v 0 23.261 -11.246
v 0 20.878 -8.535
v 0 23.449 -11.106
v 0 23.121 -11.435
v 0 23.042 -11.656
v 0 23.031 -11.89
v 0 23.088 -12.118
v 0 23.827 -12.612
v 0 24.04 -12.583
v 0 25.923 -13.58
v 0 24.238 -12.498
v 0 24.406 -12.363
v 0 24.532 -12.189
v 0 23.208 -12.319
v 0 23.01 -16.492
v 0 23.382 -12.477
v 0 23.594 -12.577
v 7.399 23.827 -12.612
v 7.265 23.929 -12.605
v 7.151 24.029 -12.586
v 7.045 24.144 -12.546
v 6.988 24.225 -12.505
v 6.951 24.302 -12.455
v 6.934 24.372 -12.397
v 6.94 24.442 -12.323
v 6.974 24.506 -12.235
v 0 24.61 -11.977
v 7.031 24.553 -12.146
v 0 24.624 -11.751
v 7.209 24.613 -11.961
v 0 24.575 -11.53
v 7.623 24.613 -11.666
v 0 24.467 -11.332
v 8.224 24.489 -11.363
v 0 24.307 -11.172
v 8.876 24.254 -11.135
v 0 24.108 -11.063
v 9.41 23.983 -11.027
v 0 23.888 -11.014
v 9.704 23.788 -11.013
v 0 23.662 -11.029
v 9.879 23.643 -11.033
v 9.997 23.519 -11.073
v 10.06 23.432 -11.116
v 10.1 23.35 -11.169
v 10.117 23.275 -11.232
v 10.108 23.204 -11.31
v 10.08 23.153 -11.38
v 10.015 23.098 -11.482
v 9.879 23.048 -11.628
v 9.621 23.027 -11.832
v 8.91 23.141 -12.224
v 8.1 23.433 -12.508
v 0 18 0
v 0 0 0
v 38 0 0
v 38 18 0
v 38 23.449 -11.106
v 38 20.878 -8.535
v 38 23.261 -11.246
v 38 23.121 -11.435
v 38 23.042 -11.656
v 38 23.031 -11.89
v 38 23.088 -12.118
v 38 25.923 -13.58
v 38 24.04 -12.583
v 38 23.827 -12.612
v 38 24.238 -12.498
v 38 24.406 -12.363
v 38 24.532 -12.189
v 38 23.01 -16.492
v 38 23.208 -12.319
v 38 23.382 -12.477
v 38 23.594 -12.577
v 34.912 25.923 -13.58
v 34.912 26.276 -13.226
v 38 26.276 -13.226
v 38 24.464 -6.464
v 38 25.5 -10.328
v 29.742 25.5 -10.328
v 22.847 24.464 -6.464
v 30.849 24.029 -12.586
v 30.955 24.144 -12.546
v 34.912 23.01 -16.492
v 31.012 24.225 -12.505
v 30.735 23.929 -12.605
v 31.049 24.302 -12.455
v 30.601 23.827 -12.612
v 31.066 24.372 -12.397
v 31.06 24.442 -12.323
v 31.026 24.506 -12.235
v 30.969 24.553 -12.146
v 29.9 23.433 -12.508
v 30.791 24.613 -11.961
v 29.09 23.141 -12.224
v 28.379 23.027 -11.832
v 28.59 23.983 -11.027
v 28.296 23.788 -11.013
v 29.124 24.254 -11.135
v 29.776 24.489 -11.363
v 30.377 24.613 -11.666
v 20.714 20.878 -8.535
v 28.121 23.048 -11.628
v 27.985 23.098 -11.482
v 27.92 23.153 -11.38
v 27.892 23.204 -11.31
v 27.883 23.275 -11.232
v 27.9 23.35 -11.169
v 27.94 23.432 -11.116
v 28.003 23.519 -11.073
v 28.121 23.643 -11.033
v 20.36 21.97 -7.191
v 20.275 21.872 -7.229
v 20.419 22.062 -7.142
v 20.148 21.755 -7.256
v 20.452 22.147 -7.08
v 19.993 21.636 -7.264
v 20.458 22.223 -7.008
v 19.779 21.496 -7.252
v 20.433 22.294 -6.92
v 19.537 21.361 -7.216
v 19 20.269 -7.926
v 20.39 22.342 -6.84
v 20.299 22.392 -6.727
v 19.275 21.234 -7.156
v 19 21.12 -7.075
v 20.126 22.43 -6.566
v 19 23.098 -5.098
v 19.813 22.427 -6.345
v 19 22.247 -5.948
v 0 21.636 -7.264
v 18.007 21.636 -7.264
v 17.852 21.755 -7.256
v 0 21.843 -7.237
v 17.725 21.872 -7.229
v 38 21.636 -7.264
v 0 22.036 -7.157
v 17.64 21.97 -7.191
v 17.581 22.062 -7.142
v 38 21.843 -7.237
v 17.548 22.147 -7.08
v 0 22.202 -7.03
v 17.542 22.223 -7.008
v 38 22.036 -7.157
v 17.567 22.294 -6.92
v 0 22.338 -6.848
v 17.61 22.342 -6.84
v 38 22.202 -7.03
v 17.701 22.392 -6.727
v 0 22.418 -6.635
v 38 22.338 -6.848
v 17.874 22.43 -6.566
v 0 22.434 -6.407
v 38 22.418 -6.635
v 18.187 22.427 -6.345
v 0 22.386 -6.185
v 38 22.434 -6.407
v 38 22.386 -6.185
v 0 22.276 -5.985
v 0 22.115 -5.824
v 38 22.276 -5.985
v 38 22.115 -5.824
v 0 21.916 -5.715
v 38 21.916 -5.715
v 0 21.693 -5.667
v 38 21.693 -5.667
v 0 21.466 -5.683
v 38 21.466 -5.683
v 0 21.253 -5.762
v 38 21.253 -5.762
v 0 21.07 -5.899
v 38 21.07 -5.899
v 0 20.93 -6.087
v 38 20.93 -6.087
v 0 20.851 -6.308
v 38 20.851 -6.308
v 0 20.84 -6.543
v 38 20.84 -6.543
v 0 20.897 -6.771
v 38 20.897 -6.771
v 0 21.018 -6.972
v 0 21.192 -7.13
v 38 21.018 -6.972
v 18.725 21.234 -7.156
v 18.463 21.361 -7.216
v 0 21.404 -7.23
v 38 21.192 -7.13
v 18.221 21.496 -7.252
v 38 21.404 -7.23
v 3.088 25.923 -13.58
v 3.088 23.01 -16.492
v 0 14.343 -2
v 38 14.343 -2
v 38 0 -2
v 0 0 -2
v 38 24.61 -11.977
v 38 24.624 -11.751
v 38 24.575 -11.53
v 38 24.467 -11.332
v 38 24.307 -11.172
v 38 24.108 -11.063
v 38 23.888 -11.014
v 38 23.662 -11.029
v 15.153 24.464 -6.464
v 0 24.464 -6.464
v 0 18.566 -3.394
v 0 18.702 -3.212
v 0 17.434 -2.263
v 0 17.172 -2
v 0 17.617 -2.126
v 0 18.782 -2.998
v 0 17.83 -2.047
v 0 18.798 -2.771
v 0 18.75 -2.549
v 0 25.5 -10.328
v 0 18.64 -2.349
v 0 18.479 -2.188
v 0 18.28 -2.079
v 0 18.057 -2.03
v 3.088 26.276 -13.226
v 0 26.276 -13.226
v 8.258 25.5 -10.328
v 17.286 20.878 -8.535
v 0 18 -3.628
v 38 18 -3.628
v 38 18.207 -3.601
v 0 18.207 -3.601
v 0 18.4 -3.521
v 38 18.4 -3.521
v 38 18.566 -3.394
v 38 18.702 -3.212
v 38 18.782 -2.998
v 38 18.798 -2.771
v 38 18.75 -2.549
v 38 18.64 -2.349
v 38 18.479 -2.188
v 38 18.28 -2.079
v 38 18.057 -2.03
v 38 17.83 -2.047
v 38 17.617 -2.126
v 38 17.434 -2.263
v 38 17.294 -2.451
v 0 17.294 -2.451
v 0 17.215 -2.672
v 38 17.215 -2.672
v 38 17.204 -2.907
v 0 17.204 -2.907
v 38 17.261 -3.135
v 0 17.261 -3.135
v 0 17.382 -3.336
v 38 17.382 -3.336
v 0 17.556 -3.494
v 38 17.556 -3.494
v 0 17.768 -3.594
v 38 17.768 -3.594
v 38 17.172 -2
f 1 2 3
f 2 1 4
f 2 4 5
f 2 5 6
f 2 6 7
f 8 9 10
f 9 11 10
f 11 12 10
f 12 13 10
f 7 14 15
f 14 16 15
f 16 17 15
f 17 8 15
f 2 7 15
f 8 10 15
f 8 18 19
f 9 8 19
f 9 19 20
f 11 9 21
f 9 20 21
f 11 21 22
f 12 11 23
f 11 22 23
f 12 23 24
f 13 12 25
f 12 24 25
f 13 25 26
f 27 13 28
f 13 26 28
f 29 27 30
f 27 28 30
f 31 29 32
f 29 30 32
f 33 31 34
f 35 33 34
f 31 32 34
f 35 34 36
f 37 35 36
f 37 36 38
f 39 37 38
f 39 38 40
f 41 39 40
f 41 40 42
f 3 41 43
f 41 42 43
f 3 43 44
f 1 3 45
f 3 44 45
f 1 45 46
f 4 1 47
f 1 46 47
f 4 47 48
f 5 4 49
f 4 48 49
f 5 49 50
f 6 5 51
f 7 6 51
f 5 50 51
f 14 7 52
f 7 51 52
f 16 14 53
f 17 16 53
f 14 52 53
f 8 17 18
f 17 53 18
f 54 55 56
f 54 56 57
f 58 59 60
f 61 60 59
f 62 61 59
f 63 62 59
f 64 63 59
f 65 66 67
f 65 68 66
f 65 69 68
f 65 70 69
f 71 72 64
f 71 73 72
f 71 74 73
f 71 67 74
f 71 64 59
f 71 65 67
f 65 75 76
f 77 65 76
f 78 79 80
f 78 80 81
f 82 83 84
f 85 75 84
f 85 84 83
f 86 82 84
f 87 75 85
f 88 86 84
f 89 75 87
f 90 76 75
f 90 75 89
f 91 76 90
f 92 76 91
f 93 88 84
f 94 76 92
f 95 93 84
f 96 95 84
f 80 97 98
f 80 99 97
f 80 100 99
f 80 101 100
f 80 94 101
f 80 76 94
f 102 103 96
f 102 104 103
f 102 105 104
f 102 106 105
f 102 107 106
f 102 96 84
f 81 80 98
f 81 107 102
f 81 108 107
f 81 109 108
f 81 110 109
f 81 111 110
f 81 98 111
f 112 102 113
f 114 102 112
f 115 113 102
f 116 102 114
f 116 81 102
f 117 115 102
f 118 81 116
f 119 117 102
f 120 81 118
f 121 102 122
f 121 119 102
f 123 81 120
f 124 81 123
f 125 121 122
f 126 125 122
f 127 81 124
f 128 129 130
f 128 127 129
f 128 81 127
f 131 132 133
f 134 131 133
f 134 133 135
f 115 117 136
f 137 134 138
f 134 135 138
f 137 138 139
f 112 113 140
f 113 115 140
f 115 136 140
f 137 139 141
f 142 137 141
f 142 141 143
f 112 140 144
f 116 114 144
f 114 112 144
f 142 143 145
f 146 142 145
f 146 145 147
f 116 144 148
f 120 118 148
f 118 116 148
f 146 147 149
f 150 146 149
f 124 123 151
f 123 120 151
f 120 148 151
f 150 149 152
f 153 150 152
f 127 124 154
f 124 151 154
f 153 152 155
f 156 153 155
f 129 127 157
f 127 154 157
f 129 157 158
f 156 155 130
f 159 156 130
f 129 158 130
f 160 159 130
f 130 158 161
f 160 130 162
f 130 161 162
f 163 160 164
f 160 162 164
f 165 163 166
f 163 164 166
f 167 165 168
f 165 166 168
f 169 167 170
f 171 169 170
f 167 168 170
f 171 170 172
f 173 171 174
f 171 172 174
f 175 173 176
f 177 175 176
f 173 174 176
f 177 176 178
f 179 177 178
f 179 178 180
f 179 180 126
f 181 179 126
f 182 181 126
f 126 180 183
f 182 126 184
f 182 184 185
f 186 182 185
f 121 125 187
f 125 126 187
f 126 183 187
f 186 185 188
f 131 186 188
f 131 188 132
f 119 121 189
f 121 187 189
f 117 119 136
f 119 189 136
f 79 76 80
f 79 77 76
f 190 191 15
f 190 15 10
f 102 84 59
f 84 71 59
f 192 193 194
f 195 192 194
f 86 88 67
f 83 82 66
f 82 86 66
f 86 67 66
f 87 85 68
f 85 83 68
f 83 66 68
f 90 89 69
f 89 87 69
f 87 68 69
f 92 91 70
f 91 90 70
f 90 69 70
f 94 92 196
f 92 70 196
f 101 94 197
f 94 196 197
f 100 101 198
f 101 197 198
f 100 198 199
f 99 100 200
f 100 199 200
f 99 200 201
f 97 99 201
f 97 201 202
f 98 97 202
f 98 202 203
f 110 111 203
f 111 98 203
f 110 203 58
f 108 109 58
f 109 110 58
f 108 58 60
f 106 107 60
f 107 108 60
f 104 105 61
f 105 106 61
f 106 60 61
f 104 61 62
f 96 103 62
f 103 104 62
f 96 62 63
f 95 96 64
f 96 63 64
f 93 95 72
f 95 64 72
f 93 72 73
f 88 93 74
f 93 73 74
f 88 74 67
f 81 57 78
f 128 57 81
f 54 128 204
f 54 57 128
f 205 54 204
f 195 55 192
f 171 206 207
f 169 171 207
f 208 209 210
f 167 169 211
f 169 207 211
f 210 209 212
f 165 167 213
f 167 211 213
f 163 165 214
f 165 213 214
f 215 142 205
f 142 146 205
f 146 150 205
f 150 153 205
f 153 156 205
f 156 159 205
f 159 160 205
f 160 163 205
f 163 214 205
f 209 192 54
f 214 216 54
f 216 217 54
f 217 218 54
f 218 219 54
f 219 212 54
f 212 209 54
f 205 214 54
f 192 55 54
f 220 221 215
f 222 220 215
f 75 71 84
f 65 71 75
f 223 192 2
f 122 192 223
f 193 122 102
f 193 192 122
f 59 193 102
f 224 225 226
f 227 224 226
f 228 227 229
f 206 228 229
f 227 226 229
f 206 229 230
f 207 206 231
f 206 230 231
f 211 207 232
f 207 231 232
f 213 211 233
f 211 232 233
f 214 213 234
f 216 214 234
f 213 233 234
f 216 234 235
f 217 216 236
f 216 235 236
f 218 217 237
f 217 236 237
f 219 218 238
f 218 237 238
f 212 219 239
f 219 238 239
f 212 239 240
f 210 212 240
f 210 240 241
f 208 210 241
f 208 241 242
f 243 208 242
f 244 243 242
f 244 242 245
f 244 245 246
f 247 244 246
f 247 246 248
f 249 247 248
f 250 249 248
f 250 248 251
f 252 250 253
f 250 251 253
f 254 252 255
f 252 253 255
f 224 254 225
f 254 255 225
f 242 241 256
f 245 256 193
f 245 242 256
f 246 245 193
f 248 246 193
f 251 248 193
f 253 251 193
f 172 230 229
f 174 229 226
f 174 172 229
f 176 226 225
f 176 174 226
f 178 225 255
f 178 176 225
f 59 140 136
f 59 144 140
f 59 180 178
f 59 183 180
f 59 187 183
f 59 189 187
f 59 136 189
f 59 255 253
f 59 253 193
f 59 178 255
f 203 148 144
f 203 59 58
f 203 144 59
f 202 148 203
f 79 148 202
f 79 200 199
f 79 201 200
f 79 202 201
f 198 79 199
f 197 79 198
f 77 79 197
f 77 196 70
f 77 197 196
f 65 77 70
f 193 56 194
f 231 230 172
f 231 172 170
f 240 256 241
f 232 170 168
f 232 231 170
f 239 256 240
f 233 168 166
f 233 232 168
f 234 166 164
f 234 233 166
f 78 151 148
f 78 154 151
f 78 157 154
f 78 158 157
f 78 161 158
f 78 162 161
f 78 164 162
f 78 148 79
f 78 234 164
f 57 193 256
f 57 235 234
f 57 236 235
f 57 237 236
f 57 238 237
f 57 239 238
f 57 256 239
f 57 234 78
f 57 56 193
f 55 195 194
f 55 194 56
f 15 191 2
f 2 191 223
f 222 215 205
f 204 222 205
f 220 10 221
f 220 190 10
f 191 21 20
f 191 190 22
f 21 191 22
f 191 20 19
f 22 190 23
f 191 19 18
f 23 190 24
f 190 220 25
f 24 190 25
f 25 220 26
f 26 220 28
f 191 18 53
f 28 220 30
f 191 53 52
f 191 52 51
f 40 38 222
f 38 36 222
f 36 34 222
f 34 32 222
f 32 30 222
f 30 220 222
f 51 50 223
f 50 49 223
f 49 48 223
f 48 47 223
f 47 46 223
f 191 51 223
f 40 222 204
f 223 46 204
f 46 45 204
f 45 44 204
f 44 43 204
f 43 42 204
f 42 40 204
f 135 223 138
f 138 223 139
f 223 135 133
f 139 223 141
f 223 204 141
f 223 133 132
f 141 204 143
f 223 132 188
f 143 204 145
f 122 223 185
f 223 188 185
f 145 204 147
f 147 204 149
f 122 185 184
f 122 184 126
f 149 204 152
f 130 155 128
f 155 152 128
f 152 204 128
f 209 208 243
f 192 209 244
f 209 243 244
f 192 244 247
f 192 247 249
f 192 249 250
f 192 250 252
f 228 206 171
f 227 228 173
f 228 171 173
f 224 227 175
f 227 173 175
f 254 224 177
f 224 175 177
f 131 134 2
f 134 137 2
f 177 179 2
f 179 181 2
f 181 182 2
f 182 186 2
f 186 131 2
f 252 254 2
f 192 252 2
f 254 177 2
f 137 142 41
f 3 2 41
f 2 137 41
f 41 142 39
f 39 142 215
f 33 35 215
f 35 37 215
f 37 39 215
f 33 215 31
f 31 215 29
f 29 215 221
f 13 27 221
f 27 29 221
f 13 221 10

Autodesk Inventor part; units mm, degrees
ref_plane "YZ Plane" through (0, 0, 0) normal (1, 0, 0) x (0, 1, 0)
ref_plane "XZ Plane" through (0, 0, 0) normal (0, 1, 0) x (-1, 0, 0)
sketch "スケッチ1" plane through (0, 0, 0) normal (1, 0, 0) x (0, 1, 0)
  line L0 (0, 0) -> (18, 0)
  line L1 (18, 0) -> (18, -2)
  line L2 (18, -2) -> (0, -2)
  line L3 (0, -2) -> (0, 0)
  line L4 (18, 0) -> (39.2132, -21.2132)
  line L5 (39.2132, -21.2132) -> (37.799, -22.6274)
  line L6 (37.799, -22.6274) -> (17.1716, -2)
  dimension "d0" = 2
  dimension "d1" = 18
  dimension "d4" = 30
  dimension "d5" = 135
  dimension "d6" = 2
extrude "押し出し1" add sketch "スケッチ1" along normal blind 38
sketch "スケッチ2" plane through (38, 0, 0) normal (1, 0, 0) x (0, 0, -1)
  line L0 (13.2259, 26.2762) -> (6.4645, 24.4645) projected
  line L1 (2, 0) -> (2, 17.1716) projected
  line L2 (2, 17.1716) -> (22.6274, 37.799) projected
  line L3 (22.6274, 37.799) -> (21.2132, 39.2132) projected
  line L4 (21.2132, 39.2132) -> (0, 18) projected
  line L5 (0, 18) -> (0, 0) projected
  line L6 (0, 0) -> (2, 0) projected
  point P0 (10.3282, 25.4997)
extrude "押し出し2" cut sketch "スケッチ2" against normal through all contours L0 L4 L3 L2
sketch "スケッチ3" plane through (38, 0, 0) normal (1, 0, 0) x (0, 0, -1)
  line L0 (0, -0.1838) -> (49.5981, -49.7818) projected
  line L1 (49.5981, -49.7818) -> (50.9877, -48.3922) projected
  line L2 (50.9877, -48.3922) -> (50.3051, -40.5894) projected
  line L3 (50.3051, -40.5894) -> (38.2775, -28.5617) projected
  line L4 (38.2775, -28.5617) -> (34.3952, -14.0729) projected
  line L5 (34.3952, -14.0729) -> (39.6985, -8.7696) projected
  line L6 (25.2028, 5.7261) -> (39.6985, -8.7696) projected
  line L7 (25.2028, 9.9688) -> (25.2468, 10.0127) projected
  line L8 (25.2468, 14.2554) -> (13.2259, 26.2762) projected
  line L9 (13.2259, 26.2762) -> (6.4645, 24.4645) projected
  line L10 (6.4645, 24.4645) -> (0, 18) projected
  circle A0 centre (45.0018, -38.8216) radius 0.8 projected
  circle A1 centre (48.5373, -42.3571) radius 0.8 projected
  line L11 (25.2886, 2.8119) -> (28.6525, -0.552) projected
  arc A2 (29.0919, -1.6127) -> (28.6525, -0.552) centre (27.5919, -1.6127) ccw projected
  line L12 (29.0919, -1.6127) -> (29.0919, -20.7046) projected
  arc A3 (26.5312, -21.7652) -> (29.0919, -20.7046) centre (27.5919, -20.7046) ccw projected
  line L13 (26.5312, -21.7652) -> (23.1673, -18.4013) projected
  arc A4 (22.7279, -17.3406) -> (23.1673, -18.4013) centre (24.2279, -17.3406) ccw projected
  line L14 (22.7279, -17.3406) -> (22.7279, 1.7513) projected
  arc A5 (25.2886, 2.8119) -> (22.7279, 1.7513) centre (24.2279, 1.7513) ccw projected
  line L15 (13.8033, -9.0373) -> (10.4393, -5.6734) projected
  arc A6 (10, -4.6127) -> (10.4393, -5.6734) centre (11.5, -4.6127) ccw projected
  line L16 (10, -4.6127) -> (10, 14.4792) projected
  arc A7 (12.5607, 15.5398) -> (10, 14.4792) centre (11.5, 14.4792) ccw projected
  line L17 (12.5607, 15.5398) -> (15.9246, 12.1759) projected
  arc A8 (16.364, 11.1152) -> (15.9246, 12.1759) centre (14.864, 11.1152) ccw projected
  line L18 (16.364, 11.1152) -> (16.364, -7.9767) projected
  arc A9 (13.8033, -9.0373) -> (16.364, -7.9767) centre (14.864, -7.9767) ccw projected
  line L19 (2, 0) -> (2, 17.1716) projected
  line L20 (2, 14.3431) -> (13.5795, 25.9226)
  line L21 (16.4919, 23.0102) -> (8.535, 20.8782)
  line L22 (6.4645, 24.4645) -> (0, 18) projected
  line L23 (2, 17.1716) -> (10.3282, 25.4997) projected
  circle A10 centre (11.8117, 23.8267) radius 0.8 projected
  circle A11 centre (2.8284, 18) radius 0.8 projected
  circle A12 centre (6.4645, 21.636) radius 0.8 projected
  arc A13 (25.2028, 9.9688) -> (25.2028, 5.7261) centre (27.3241, 7.8475) ccw projected
  circle A14 centre (16.7615, 19.9122) radius 0.8 projected
  line L24 (0, 18) -> (0, -0.1838) projected
  arc A15 (25.2468, 10.0127) -> (25.2468, 14.2554) centre (23.1254, 12.1341) ccw projected
  circle A16 centre (20.297, 16.3767) radius 0.8 projected
  point P0 (0, 0)
  dimension "d9" = 4
  dimension "d10" = 4
ref_plane "作業平面1" through (0, -49.7818, -69.441) normal (1, 0, 0) x (0, 0.7071068, -0.7071068)
extrude "押し出し3" add sketch "スケッチ3" against normal up to surface (38 mm away) contours L9 L8 L20 A10 L19 L23 A11 A12 | A12 L23 | L8 L21 L20 A10 | A10 L20 | L20 A10 | A11 L23 picked at (6.7643, 21.5956) picked at (2.746, 17.7464)
sketch "スケッチ4" plane through (38, 0, 0) normal (1, 0, 0) x (0, 0, -1)
  circle A0 centre (2.8284, 18) radius 0.8
  circle A1 centre (6.4645, 21.636) radius 0.8
  circle A2 centre (11.8117, 23.8267) radius 0.8
  line L0 (6.4645, 24.4645) -> (0, 18) projected
  line L1 (13.2259, 26.2762) -> (6.4645, 24.4645) projected
  line L2 (11.8117, 23.8267) -> (11.2941, 25.7586)
  point P0 (0, 0)
  dimension "d13" = 1.6
  dimension "d14" = 2
  dimension "d15" = 2
  dimension "d16" = 2
  dimension "d17" = 2
extrude "押し出し4" cut sketch "スケッチ4" against normal through all
sketch "スケッチ5" plane through (0, 18, 0) normal (0, 0.7071068, 0.7071068) x (1, 0, 0)
  line L0 (19, 8.3282) -> (1.5, 17.1212) projected
  line L1 (36.5, 17.1212) -> (19, 8.3282) projected
  line L2 (38, 15.2043) -> (0, 15.2043) projected
  line L3 (3.0877, 15.2043) -> (19, 7.209)
  line L4 (38, 15.2043) -> (0, 15.2043) projected
  line L5 (34.9123, 15.2043) -> (19, 7.209)
  point P0 (0, -12.7279)
  dimension "d20" = 1
extrude "押し出し5" cut sketch "スケッチ5" against normal through all
equation "\"d15\" = d14"
properties part number "upper"
